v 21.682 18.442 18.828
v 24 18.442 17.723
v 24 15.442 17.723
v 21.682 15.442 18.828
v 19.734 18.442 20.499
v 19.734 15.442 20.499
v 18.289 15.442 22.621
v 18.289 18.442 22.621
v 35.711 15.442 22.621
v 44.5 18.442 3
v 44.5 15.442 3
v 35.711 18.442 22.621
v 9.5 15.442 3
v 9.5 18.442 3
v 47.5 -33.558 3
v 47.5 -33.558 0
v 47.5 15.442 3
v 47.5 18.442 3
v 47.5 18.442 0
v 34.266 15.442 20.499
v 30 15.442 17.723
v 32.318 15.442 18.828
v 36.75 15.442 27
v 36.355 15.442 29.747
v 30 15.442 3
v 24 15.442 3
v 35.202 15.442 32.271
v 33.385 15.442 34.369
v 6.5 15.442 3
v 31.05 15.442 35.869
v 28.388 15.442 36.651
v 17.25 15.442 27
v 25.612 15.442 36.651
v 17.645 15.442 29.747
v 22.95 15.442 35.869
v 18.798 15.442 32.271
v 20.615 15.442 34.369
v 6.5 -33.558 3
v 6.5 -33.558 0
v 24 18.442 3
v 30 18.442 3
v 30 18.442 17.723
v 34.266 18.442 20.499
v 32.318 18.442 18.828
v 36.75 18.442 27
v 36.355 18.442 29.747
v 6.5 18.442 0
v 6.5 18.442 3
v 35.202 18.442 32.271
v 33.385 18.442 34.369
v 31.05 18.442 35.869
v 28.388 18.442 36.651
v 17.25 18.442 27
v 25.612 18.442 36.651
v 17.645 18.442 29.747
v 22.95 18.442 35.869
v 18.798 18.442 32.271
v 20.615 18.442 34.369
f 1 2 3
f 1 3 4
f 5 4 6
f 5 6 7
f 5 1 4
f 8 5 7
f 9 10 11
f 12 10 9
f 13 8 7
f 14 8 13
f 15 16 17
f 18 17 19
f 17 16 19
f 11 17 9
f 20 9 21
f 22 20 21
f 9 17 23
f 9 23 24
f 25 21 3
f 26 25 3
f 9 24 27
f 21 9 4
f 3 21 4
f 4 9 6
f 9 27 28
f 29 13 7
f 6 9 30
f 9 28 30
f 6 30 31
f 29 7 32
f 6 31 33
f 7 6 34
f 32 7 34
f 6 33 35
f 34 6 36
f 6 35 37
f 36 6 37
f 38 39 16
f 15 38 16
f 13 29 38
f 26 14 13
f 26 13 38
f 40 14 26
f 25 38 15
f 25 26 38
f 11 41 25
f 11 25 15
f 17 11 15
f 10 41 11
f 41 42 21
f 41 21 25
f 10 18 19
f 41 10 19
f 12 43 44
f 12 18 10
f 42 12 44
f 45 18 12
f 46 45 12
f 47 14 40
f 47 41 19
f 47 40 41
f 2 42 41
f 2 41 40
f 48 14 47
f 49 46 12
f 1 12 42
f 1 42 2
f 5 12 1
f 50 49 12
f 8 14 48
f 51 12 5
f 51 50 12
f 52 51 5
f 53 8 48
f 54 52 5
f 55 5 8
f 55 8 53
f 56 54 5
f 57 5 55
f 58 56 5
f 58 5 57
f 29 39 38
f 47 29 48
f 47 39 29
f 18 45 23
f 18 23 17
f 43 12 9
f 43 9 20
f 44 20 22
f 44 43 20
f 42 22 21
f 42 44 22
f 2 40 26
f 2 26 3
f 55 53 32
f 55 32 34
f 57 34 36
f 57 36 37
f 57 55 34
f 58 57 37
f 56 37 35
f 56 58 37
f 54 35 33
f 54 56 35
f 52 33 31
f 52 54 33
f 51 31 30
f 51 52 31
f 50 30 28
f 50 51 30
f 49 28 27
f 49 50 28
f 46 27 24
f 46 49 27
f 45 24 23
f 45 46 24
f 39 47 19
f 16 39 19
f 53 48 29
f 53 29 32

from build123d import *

# Parameters (mm, degrees)
F0_W     = 41
F0_H     = 52
F1_DEPTH = 3
F3_DEPTH = 3


with BuildPart() as f1:
    # F0 (on Top) → F1 (new body)
    with BuildSketch(Plane.XY):
        with Locations((27.000003, -7.557694)):
            Rectangle(F0_W, F0_H)
    extrude(amount=F1_DEPTH)

    # F2 (on face) → F3 (join)
    with BuildSketch(Plane(origin=(0, 18.442306, 0), x_dir=(-1, 0, 0), z_dir=(0, 1, 0))):
        with BuildLine():
            ThreePointArc((-18.288633, 22.621127), (-17.513213, 24.749818), (-17.250003, 27))
            ThreePointArc((-17.250003, 27), (-27.000003, 36.75), (-36.750003, 27))
            ThreePointArc((-36.750003, 27), (-36.486793, 24.749818), (-35.711373, 22.621127))
            ThreePointArc((-35.711373, 22.621127), (-33.347202, 19.598948), (-30.000003, 17.723012))
            ThreePointArc((-30.000003, 17.723012), (-28.518534, 17.368979), (-27.000003, 17.25))
            ThreePointArc((-27.000003, 17.25), (-25.481473, 17.368979), (-24.000003, 17.723012))
            ThreePointArc((-24.000003, 17.723012), (-20.652805, 19.598948), (-18.288633, 22.621127))
        make_face()
        with BuildLine():
            ThreePointArc((-35.711373, 22.621127), (-36.486793, 24.749818), (-36.750003, 27))
            Line((-36.750003, 27), (-47.500003, 3))
            Line((-47.500003, 3), (-44.500003, 3))
            Line((-44.500003, 3), (-35.711373, 22.621127))
        make_face()
        with BuildLine():
            Line((-24.000003, 3), (-24.000003, 17.723012))
            ThreePointArc((-24.000003, 17.723012), (-25.481473, 17.368979), (-27.000003, 17.25))
            Line((-27.000003, 17.25), (-27.000003, 3))
            Line((-27.000003, 3), (-24.000003, 3))
        make_face()
        with BuildLine():
            ThreePointArc((-27.000003, 17.25), (-28.518534, 17.368979), (-30.000003, 17.723012))
            Line((-30.000003, 17.723012), (-30.000003, 3))
            Line((-30.000003, 3), (-27.000003, 3))
            Line((-27.000003, 3), (-27.000003, 17.25))
        make_face()
        with BuildLine():
            Line((-9.500003, 3), (-6.500003, 3))
            Line((-6.500003, 3), (-17.250003, 27))
            ThreePointArc((-17.250003, 27), (-17.513213, 24.749818), (-18.288633, 22.621127))
            Line((-18.288633, 22.621127), (-9.500003, 3))
        make_face()
    extrude(amount=-F3_DEPTH)


solid = f1.part
